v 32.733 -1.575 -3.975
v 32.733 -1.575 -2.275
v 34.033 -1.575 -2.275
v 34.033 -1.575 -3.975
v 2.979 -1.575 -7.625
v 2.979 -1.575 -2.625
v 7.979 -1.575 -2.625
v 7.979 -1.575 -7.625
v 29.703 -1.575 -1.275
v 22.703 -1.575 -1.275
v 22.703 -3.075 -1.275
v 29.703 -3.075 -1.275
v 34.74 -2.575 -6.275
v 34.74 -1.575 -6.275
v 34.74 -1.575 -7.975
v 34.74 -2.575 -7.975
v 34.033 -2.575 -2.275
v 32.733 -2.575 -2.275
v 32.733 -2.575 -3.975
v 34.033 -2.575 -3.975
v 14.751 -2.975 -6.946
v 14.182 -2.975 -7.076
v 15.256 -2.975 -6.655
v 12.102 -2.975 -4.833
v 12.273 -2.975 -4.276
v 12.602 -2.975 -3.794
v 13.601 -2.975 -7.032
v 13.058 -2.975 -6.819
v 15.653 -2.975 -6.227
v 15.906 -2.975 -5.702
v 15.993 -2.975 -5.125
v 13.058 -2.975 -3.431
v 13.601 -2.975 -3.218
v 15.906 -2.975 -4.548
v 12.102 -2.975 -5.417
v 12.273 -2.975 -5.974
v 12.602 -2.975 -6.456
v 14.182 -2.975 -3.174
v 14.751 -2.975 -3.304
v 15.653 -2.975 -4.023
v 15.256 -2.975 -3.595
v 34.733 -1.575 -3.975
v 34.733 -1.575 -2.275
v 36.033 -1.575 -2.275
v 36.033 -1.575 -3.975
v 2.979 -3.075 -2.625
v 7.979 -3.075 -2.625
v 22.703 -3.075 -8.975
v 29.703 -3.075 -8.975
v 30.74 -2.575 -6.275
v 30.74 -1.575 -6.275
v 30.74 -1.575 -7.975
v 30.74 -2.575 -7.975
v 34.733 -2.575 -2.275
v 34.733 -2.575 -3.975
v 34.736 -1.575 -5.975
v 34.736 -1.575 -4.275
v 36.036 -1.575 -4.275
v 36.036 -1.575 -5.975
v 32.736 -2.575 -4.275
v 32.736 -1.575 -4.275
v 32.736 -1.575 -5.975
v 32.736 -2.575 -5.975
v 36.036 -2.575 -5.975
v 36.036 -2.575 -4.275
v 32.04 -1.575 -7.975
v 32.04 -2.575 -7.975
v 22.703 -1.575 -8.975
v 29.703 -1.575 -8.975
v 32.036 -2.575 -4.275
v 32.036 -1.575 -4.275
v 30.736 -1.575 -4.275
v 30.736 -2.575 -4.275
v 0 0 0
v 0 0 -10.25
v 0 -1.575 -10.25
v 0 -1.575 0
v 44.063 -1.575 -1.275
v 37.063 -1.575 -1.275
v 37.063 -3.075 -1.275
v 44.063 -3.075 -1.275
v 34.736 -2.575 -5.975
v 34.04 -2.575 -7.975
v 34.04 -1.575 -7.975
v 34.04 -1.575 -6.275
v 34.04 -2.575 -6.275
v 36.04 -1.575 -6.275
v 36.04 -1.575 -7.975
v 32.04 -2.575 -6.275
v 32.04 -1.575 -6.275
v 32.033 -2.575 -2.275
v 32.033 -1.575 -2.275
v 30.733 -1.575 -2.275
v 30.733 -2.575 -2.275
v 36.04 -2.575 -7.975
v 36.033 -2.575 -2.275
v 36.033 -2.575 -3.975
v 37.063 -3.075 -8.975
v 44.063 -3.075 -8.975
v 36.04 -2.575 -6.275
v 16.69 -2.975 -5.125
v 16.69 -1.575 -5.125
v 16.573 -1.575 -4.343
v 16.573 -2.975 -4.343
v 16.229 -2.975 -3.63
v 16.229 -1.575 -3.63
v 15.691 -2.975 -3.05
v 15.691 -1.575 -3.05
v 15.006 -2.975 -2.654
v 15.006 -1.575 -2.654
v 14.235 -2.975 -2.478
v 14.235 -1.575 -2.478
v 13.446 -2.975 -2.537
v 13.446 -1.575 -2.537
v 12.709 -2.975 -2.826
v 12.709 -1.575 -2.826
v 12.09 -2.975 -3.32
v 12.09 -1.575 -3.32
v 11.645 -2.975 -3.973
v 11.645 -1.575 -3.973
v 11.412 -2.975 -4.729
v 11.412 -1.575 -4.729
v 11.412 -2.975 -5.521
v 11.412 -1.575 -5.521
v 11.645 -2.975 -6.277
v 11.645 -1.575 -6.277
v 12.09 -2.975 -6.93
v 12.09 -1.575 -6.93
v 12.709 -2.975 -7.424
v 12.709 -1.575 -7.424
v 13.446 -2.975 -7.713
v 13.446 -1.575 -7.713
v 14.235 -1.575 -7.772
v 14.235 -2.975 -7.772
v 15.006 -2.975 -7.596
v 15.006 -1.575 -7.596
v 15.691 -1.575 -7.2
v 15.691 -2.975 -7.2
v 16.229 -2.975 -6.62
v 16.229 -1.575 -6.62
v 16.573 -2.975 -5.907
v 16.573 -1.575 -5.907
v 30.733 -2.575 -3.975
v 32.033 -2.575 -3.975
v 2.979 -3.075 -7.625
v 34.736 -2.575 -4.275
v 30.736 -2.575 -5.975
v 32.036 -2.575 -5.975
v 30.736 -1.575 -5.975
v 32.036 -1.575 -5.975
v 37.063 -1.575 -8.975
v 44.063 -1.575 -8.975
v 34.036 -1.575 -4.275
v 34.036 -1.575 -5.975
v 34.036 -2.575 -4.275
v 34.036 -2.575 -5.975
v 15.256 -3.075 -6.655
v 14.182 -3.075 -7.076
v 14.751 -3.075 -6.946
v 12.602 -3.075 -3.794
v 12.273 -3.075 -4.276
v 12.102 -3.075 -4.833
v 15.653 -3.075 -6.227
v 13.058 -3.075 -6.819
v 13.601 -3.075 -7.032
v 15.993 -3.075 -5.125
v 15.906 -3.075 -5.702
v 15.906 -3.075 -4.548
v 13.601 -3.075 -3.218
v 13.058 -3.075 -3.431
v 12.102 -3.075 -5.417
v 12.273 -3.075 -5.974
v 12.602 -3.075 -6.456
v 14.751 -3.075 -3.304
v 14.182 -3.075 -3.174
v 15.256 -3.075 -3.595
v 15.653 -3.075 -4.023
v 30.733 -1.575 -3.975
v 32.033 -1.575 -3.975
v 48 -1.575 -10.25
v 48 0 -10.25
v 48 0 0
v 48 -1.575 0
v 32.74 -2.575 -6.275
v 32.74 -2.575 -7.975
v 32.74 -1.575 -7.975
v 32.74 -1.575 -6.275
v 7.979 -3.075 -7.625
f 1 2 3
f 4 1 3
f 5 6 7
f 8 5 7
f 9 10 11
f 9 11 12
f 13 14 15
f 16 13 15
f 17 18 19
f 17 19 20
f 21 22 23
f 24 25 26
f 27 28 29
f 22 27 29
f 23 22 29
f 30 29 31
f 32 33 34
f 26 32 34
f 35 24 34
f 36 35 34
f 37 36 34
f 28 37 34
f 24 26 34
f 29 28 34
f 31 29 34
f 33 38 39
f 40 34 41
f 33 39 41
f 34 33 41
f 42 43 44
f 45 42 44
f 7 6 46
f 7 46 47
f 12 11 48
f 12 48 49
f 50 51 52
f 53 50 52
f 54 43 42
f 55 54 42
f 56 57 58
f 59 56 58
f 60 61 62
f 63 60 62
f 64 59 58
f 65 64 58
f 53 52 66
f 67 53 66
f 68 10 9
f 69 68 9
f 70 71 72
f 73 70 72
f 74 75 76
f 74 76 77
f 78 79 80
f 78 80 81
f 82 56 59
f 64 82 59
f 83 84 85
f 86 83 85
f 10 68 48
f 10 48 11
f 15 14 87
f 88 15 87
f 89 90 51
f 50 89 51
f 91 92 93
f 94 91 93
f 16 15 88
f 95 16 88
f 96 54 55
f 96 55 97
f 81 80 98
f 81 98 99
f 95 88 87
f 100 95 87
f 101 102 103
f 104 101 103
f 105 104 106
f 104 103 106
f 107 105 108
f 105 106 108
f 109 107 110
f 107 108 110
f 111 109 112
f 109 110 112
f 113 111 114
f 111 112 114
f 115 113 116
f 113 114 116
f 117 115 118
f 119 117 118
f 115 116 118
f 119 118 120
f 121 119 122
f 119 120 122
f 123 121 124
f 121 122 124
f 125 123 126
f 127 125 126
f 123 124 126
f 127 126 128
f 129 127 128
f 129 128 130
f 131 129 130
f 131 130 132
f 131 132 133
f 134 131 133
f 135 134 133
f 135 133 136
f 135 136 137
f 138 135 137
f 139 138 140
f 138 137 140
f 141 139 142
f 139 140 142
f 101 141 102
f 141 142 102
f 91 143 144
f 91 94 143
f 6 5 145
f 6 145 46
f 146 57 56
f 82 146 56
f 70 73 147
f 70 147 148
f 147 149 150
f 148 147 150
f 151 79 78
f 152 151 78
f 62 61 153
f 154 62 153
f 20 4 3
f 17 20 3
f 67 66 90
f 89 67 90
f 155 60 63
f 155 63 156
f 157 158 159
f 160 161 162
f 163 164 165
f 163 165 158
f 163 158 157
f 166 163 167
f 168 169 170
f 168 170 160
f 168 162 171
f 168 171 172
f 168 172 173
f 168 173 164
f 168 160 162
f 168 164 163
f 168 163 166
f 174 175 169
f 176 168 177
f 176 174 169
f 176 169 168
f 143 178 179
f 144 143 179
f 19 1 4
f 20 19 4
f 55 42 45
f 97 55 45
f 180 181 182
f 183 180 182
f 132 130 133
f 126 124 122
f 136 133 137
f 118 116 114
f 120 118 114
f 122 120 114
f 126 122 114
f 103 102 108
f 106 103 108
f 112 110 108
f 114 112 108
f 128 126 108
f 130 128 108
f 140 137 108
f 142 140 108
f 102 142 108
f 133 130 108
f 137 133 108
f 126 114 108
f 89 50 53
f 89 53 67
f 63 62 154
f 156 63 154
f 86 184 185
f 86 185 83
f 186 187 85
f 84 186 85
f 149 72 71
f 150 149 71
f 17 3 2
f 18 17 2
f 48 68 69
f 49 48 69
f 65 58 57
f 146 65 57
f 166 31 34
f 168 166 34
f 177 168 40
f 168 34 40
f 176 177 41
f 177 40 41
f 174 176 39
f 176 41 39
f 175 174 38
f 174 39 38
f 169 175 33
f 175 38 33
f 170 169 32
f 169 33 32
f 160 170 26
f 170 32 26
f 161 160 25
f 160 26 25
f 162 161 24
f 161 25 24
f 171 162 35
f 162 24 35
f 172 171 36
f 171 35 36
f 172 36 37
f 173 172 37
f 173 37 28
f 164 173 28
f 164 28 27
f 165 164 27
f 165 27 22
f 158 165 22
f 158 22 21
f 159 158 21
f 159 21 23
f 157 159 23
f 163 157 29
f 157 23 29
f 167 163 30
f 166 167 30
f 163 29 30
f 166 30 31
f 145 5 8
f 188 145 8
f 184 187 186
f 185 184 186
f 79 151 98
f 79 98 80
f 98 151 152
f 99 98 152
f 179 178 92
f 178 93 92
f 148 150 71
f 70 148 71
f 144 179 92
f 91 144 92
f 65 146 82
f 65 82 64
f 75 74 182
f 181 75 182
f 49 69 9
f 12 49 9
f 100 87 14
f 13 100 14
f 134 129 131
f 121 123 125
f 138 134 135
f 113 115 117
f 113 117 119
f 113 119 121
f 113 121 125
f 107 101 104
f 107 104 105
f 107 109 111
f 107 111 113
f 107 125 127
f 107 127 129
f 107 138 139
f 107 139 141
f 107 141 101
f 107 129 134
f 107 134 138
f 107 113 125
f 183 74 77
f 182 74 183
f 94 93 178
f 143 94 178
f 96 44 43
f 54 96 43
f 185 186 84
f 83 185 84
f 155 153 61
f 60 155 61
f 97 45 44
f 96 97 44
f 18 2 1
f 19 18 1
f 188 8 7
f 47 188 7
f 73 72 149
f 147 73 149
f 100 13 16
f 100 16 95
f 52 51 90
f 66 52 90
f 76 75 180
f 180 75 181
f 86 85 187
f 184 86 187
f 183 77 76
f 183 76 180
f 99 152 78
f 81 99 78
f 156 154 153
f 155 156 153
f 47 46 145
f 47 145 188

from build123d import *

# Parameters (mm, degrees)
F0_W      = 48
F0_H      = 10.25
F1_DEPTH  = 1.5748
F2_W      = 7
F2_H      = 7.7
F2_W_2    = 5
F2_H_2    = 5
F3_DEPTH  = 1.5
F4_DEPTH  = 1.5
F2_W_3    = 1.1
F2_H_3    = 1.25
F5_DEPTH  = 1
F6_DEPTH  = 1
F7_DEPTH  = 1
F8_DEPTH  = 1
F9_DEPTH  = 1
F10_DEPTH = 1
F11_DEPTH = 1
F12_DEPTH = 1
F13_DEPTH = 1
F2_R      = 2.6543
F14_DEPTH = 1.4
F15_R     = 1.956508
F16_DEPTH = 0.1


with BuildPart() as f1:
    # F0 (on Front) → F1 (new body)
    with BuildSketch(Plane.XZ):
        with Locations((24, -5.125)):
            Rectangle(F0_W, F0_H)
    extrude(amount=F1_DEPTH)


with BuildPart() as f3:
    # F2 (on face) → F3 (new body)
    with BuildSketch(Plane.XZ.offset(1.5748)):
        with Locations((26.202524, -5.125)):
            Rectangle(F2_W, F2_H)
        with Locations((5.479097, -5.125)):
            Rectangle(F2_W_2, F2_H_2)
    extrude(amount=F3_DEPTH)


with BuildPart() as f4:
    # F2 (on face) → F4 (new body)
    with BuildSketch(Plane.XZ.offset(1.5748)):
        with Locations((40.56276, -5.125)):
            Rectangle(F2_W, F2_H)
    extrude(amount=F4_DEPTH)


with BuildPart() as f5:
    # F2 (on face) → F5 (new body)
    with BuildSketch(Plane.XZ.offset(1.5748)):
        Polygon((30.832642, -3.625003), (30.732642, -3.625003), (30.732642, -3.975003), (32.032642, -3.975003), (32.032642, -3.625003), (31.932642, -3.625003), align=None)
        with Locations((31.382642, -3.000003)):
            Rectangle(F2_W_3, F2_H_3)
        Polygon((32.032642, -2.275003), (30.732642, -2.275003), (30.732642, -3.625003), (30.832642, -3.625003), (30.832642, -2.375003), (31.932642, -2.375003), (31.932642, -3.625003), (32.032642, -3.625003), align=None)
    extrude(amount=F5_DEPTH)


with BuildPart() as f6:
    # F2 (on face) → F6 (new body)
    with BuildSketch(Plane.XZ.offset(1.5748)):
        with Locations((33.382642, -3.000003)):
            Rectangle(F2_W_3, F2_H_3)
        Polygon((32.832642, -2.375003), (33.932642, -2.375003), (33.932642, -3.625003), (34.032642, -3.625003), (34.032642, -2.275003), (32.732642, -2.275003), (32.732642, -3.625003), (32.832642, -3.625003), align=None)
        Polygon((34.032642, -3.625003), (33.932642, -3.625003), (32.832642, -3.625003), (32.732642, -3.625003), (32.732642, -3.975003), (34.032642, -3.975003), align=None)
    extrude(amount=F6_DEPTH)


with BuildPart() as f7:
    # F2 (on face) → F7 (new body)
    with BuildSketch(Plane.XZ.offset(1.5748)):
        Polygon((34.832642, -2.375003), (35.932642, -2.375003), (35.932642, -3.625003), (36.032642, -3.625003), (36.032642, -2.275003), (34.732642, -2.275003), (34.732642, -3.625003), (34.832642, -3.625003), align=None)
        with Locations((35.382642, -3.000003)):
            Rectangle(F2_W_3, F2_H_3)
        Polygon((36.032642, -3.625003), (35.932642, -3.625003), (34.832642, -3.625003), (34.732642, -3.625003), (34.732642, -3.975003), (36.032642, -3.975003), align=None)
    extrude(amount=F7_DEPTH)


with BuildPart() as f8:
    # F2 (on face) → F8 (new body)
    with BuildSketch(Plane.XZ.offset(1.5748)):
        with Locations((31.386111, -5)):
            Rectangle(F2_W_3, F2_H_3)
        Polygon((30.836111, -4.375), (31.936111, -4.375), (31.936111, -5.625), (32.036111, -5.625), (32.036111, -4.275), (30.736111, -4.275), (30.736111, -5.625), (30.836111, -5.625), align=None)
        Polygon((32.036111, -5.625), (31.936111, -5.625), (30.836111, -5.625), (30.736111, -5.625), (30.736111, -5.975), (32.036111, -5.975), align=None)
    extrude(amount=F8_DEPTH)


with BuildPart() as f9:
    # F2 (on face) → F9 (new body)
    with BuildSketch(Plane.XZ.offset(1.5748)):
        Polygon((32.836111, -4.375), (33.936111, -4.375), (33.936111, -5.625), (34.036111, -5.625), (34.036111, -4.275), (32.736111, -4.275), (32.736111, -5.625), (32.836111, -5.625), align=None)
        with Locations((33.386111, -5)):
            Rectangle(F2_W_3, F2_H_3)
        Polygon((34.036111, -5.625), (33.936111, -5.625), (32.836111, -5.625), (32.736111, -5.625), (32.736111, -5.975), (34.036111, -5.975), align=None)
    extrude(amount=F9_DEPTH)


with BuildPart() as f10:
    # F2 (on face) → F10 (new body)
    with BuildSketch(Plane.XZ.offset(1.5748)):
        with Locations((35.386111, -5)):
            Rectangle(F2_W_3, F2_H_3)
        Polygon((36.036111, -5.625), (36.036111, -4.275), (34.736111, -4.275), (34.736111, -5.625), (34.836111, -5.625), (34.836111, -4.375), (35.936111, -4.375), (35.936111, -5.625), align=None)
        Polygon((36.036111, -5.975), (36.036111, -5.625), (35.936111, -5.625), (34.836111, -5.625), (34.736111, -5.625), (34.736111, -5.975), align=None)
    extrude(amount=F10_DEPTH)


with BuildPart() as f11:
    # F2 (on face) → F11 (new body)
    with BuildSketch(Plane.XZ.offset(1.5748)):
        Polygon((30.839579, -6.374997), (31.939579, -6.374997), (31.939579, -7.624997), (32.039579, -7.624997), (32.039579, -6.274997), (30.739579, -6.274997), (30.739579, -7.624997), (30.839579, -7.624997), align=None)
        with Locations((31.389579, -6.999997)):
            Rectangle(F2_W_3, F2_H_3)
        Polygon((32.039579, -7.624997), (31.939579, -7.624997), (30.839579, -7.624997), (30.739579, -7.624997), (30.739579, -7.974997), (32.039579, -7.974997), align=None)
    extrude(amount=F11_DEPTH)


with BuildPart() as f12:
    # F2 (on face) → F12 (new body)
    with BuildSketch(Plane.XZ.offset(1.5748)):
        with Locations((33.389579, -6.999997)):
            Rectangle(F2_W_3, F2_H_3)
        Polygon((32.839579, -6.374997), (33.939579, -6.374997), (33.939579, -7.624997), (34.039579, -7.624997), (34.039579, -6.274997), (32.739579, -6.274997), (32.739579, -7.624997), (32.839579, -7.624997), align=None)
        Polygon((34.039579, -7.624997), (33.939579, -7.624997), (32.839579, -7.624997), (32.739579, -7.624997), (32.739579, -7.974997), (34.039579, -7.974997), align=None)
    extrude(amount=F12_DEPTH)


with BuildPart() as f13:
    # F2 (on face) → F13 (new body)
    with BuildSketch(Plane.XZ.offset(1.5748)):
        Polygon((36.039579, -7.974997), (36.039579, -7.624997), (35.939579, -7.624997), (34.839579, -7.624997), (34.739579, -7.624997), (34.739579, -7.974997), align=None)
        Polygon((36.039579, -7.624997), (36.039579, -6.274997), (34.739579, -6.274997), (34.739579, -7.624997), (34.839579, -7.624997), (34.839579, -6.374997), (35.939579, -6.374997), (35.939579, -7.624997), align=None)
        with Locations((35.389579, -6.999997)):
            Rectangle(F2_W_3, F2_H_3)
    extrude(amount=F13_DEPTH)


with BuildPart() as f14:
    # F2 (on face) → F14 (new body)
    with BuildSketch(Plane.XZ.offset(1.5748)):
        with Locations((14.036181, -5.125)):
            Circle(F2_R)
    extrude(amount=F14_DEPTH)


with BuildPart() as f16:
    # F15 (on face) → F16 (new body)
    with BuildSketch(Plane.XZ.offset(2.9748)):
        with Locations((14.036181, -5.125)):
            Circle(F15_R)
    extrude(amount=F16_DEPTH)


solid = Compound([f1.part, f3.part, f4.part, f5.part, f6.part, f7.part, f8.part, f9.part, f10.part, f11.part, f12.part, f13.part, f14.part, f16.part])
